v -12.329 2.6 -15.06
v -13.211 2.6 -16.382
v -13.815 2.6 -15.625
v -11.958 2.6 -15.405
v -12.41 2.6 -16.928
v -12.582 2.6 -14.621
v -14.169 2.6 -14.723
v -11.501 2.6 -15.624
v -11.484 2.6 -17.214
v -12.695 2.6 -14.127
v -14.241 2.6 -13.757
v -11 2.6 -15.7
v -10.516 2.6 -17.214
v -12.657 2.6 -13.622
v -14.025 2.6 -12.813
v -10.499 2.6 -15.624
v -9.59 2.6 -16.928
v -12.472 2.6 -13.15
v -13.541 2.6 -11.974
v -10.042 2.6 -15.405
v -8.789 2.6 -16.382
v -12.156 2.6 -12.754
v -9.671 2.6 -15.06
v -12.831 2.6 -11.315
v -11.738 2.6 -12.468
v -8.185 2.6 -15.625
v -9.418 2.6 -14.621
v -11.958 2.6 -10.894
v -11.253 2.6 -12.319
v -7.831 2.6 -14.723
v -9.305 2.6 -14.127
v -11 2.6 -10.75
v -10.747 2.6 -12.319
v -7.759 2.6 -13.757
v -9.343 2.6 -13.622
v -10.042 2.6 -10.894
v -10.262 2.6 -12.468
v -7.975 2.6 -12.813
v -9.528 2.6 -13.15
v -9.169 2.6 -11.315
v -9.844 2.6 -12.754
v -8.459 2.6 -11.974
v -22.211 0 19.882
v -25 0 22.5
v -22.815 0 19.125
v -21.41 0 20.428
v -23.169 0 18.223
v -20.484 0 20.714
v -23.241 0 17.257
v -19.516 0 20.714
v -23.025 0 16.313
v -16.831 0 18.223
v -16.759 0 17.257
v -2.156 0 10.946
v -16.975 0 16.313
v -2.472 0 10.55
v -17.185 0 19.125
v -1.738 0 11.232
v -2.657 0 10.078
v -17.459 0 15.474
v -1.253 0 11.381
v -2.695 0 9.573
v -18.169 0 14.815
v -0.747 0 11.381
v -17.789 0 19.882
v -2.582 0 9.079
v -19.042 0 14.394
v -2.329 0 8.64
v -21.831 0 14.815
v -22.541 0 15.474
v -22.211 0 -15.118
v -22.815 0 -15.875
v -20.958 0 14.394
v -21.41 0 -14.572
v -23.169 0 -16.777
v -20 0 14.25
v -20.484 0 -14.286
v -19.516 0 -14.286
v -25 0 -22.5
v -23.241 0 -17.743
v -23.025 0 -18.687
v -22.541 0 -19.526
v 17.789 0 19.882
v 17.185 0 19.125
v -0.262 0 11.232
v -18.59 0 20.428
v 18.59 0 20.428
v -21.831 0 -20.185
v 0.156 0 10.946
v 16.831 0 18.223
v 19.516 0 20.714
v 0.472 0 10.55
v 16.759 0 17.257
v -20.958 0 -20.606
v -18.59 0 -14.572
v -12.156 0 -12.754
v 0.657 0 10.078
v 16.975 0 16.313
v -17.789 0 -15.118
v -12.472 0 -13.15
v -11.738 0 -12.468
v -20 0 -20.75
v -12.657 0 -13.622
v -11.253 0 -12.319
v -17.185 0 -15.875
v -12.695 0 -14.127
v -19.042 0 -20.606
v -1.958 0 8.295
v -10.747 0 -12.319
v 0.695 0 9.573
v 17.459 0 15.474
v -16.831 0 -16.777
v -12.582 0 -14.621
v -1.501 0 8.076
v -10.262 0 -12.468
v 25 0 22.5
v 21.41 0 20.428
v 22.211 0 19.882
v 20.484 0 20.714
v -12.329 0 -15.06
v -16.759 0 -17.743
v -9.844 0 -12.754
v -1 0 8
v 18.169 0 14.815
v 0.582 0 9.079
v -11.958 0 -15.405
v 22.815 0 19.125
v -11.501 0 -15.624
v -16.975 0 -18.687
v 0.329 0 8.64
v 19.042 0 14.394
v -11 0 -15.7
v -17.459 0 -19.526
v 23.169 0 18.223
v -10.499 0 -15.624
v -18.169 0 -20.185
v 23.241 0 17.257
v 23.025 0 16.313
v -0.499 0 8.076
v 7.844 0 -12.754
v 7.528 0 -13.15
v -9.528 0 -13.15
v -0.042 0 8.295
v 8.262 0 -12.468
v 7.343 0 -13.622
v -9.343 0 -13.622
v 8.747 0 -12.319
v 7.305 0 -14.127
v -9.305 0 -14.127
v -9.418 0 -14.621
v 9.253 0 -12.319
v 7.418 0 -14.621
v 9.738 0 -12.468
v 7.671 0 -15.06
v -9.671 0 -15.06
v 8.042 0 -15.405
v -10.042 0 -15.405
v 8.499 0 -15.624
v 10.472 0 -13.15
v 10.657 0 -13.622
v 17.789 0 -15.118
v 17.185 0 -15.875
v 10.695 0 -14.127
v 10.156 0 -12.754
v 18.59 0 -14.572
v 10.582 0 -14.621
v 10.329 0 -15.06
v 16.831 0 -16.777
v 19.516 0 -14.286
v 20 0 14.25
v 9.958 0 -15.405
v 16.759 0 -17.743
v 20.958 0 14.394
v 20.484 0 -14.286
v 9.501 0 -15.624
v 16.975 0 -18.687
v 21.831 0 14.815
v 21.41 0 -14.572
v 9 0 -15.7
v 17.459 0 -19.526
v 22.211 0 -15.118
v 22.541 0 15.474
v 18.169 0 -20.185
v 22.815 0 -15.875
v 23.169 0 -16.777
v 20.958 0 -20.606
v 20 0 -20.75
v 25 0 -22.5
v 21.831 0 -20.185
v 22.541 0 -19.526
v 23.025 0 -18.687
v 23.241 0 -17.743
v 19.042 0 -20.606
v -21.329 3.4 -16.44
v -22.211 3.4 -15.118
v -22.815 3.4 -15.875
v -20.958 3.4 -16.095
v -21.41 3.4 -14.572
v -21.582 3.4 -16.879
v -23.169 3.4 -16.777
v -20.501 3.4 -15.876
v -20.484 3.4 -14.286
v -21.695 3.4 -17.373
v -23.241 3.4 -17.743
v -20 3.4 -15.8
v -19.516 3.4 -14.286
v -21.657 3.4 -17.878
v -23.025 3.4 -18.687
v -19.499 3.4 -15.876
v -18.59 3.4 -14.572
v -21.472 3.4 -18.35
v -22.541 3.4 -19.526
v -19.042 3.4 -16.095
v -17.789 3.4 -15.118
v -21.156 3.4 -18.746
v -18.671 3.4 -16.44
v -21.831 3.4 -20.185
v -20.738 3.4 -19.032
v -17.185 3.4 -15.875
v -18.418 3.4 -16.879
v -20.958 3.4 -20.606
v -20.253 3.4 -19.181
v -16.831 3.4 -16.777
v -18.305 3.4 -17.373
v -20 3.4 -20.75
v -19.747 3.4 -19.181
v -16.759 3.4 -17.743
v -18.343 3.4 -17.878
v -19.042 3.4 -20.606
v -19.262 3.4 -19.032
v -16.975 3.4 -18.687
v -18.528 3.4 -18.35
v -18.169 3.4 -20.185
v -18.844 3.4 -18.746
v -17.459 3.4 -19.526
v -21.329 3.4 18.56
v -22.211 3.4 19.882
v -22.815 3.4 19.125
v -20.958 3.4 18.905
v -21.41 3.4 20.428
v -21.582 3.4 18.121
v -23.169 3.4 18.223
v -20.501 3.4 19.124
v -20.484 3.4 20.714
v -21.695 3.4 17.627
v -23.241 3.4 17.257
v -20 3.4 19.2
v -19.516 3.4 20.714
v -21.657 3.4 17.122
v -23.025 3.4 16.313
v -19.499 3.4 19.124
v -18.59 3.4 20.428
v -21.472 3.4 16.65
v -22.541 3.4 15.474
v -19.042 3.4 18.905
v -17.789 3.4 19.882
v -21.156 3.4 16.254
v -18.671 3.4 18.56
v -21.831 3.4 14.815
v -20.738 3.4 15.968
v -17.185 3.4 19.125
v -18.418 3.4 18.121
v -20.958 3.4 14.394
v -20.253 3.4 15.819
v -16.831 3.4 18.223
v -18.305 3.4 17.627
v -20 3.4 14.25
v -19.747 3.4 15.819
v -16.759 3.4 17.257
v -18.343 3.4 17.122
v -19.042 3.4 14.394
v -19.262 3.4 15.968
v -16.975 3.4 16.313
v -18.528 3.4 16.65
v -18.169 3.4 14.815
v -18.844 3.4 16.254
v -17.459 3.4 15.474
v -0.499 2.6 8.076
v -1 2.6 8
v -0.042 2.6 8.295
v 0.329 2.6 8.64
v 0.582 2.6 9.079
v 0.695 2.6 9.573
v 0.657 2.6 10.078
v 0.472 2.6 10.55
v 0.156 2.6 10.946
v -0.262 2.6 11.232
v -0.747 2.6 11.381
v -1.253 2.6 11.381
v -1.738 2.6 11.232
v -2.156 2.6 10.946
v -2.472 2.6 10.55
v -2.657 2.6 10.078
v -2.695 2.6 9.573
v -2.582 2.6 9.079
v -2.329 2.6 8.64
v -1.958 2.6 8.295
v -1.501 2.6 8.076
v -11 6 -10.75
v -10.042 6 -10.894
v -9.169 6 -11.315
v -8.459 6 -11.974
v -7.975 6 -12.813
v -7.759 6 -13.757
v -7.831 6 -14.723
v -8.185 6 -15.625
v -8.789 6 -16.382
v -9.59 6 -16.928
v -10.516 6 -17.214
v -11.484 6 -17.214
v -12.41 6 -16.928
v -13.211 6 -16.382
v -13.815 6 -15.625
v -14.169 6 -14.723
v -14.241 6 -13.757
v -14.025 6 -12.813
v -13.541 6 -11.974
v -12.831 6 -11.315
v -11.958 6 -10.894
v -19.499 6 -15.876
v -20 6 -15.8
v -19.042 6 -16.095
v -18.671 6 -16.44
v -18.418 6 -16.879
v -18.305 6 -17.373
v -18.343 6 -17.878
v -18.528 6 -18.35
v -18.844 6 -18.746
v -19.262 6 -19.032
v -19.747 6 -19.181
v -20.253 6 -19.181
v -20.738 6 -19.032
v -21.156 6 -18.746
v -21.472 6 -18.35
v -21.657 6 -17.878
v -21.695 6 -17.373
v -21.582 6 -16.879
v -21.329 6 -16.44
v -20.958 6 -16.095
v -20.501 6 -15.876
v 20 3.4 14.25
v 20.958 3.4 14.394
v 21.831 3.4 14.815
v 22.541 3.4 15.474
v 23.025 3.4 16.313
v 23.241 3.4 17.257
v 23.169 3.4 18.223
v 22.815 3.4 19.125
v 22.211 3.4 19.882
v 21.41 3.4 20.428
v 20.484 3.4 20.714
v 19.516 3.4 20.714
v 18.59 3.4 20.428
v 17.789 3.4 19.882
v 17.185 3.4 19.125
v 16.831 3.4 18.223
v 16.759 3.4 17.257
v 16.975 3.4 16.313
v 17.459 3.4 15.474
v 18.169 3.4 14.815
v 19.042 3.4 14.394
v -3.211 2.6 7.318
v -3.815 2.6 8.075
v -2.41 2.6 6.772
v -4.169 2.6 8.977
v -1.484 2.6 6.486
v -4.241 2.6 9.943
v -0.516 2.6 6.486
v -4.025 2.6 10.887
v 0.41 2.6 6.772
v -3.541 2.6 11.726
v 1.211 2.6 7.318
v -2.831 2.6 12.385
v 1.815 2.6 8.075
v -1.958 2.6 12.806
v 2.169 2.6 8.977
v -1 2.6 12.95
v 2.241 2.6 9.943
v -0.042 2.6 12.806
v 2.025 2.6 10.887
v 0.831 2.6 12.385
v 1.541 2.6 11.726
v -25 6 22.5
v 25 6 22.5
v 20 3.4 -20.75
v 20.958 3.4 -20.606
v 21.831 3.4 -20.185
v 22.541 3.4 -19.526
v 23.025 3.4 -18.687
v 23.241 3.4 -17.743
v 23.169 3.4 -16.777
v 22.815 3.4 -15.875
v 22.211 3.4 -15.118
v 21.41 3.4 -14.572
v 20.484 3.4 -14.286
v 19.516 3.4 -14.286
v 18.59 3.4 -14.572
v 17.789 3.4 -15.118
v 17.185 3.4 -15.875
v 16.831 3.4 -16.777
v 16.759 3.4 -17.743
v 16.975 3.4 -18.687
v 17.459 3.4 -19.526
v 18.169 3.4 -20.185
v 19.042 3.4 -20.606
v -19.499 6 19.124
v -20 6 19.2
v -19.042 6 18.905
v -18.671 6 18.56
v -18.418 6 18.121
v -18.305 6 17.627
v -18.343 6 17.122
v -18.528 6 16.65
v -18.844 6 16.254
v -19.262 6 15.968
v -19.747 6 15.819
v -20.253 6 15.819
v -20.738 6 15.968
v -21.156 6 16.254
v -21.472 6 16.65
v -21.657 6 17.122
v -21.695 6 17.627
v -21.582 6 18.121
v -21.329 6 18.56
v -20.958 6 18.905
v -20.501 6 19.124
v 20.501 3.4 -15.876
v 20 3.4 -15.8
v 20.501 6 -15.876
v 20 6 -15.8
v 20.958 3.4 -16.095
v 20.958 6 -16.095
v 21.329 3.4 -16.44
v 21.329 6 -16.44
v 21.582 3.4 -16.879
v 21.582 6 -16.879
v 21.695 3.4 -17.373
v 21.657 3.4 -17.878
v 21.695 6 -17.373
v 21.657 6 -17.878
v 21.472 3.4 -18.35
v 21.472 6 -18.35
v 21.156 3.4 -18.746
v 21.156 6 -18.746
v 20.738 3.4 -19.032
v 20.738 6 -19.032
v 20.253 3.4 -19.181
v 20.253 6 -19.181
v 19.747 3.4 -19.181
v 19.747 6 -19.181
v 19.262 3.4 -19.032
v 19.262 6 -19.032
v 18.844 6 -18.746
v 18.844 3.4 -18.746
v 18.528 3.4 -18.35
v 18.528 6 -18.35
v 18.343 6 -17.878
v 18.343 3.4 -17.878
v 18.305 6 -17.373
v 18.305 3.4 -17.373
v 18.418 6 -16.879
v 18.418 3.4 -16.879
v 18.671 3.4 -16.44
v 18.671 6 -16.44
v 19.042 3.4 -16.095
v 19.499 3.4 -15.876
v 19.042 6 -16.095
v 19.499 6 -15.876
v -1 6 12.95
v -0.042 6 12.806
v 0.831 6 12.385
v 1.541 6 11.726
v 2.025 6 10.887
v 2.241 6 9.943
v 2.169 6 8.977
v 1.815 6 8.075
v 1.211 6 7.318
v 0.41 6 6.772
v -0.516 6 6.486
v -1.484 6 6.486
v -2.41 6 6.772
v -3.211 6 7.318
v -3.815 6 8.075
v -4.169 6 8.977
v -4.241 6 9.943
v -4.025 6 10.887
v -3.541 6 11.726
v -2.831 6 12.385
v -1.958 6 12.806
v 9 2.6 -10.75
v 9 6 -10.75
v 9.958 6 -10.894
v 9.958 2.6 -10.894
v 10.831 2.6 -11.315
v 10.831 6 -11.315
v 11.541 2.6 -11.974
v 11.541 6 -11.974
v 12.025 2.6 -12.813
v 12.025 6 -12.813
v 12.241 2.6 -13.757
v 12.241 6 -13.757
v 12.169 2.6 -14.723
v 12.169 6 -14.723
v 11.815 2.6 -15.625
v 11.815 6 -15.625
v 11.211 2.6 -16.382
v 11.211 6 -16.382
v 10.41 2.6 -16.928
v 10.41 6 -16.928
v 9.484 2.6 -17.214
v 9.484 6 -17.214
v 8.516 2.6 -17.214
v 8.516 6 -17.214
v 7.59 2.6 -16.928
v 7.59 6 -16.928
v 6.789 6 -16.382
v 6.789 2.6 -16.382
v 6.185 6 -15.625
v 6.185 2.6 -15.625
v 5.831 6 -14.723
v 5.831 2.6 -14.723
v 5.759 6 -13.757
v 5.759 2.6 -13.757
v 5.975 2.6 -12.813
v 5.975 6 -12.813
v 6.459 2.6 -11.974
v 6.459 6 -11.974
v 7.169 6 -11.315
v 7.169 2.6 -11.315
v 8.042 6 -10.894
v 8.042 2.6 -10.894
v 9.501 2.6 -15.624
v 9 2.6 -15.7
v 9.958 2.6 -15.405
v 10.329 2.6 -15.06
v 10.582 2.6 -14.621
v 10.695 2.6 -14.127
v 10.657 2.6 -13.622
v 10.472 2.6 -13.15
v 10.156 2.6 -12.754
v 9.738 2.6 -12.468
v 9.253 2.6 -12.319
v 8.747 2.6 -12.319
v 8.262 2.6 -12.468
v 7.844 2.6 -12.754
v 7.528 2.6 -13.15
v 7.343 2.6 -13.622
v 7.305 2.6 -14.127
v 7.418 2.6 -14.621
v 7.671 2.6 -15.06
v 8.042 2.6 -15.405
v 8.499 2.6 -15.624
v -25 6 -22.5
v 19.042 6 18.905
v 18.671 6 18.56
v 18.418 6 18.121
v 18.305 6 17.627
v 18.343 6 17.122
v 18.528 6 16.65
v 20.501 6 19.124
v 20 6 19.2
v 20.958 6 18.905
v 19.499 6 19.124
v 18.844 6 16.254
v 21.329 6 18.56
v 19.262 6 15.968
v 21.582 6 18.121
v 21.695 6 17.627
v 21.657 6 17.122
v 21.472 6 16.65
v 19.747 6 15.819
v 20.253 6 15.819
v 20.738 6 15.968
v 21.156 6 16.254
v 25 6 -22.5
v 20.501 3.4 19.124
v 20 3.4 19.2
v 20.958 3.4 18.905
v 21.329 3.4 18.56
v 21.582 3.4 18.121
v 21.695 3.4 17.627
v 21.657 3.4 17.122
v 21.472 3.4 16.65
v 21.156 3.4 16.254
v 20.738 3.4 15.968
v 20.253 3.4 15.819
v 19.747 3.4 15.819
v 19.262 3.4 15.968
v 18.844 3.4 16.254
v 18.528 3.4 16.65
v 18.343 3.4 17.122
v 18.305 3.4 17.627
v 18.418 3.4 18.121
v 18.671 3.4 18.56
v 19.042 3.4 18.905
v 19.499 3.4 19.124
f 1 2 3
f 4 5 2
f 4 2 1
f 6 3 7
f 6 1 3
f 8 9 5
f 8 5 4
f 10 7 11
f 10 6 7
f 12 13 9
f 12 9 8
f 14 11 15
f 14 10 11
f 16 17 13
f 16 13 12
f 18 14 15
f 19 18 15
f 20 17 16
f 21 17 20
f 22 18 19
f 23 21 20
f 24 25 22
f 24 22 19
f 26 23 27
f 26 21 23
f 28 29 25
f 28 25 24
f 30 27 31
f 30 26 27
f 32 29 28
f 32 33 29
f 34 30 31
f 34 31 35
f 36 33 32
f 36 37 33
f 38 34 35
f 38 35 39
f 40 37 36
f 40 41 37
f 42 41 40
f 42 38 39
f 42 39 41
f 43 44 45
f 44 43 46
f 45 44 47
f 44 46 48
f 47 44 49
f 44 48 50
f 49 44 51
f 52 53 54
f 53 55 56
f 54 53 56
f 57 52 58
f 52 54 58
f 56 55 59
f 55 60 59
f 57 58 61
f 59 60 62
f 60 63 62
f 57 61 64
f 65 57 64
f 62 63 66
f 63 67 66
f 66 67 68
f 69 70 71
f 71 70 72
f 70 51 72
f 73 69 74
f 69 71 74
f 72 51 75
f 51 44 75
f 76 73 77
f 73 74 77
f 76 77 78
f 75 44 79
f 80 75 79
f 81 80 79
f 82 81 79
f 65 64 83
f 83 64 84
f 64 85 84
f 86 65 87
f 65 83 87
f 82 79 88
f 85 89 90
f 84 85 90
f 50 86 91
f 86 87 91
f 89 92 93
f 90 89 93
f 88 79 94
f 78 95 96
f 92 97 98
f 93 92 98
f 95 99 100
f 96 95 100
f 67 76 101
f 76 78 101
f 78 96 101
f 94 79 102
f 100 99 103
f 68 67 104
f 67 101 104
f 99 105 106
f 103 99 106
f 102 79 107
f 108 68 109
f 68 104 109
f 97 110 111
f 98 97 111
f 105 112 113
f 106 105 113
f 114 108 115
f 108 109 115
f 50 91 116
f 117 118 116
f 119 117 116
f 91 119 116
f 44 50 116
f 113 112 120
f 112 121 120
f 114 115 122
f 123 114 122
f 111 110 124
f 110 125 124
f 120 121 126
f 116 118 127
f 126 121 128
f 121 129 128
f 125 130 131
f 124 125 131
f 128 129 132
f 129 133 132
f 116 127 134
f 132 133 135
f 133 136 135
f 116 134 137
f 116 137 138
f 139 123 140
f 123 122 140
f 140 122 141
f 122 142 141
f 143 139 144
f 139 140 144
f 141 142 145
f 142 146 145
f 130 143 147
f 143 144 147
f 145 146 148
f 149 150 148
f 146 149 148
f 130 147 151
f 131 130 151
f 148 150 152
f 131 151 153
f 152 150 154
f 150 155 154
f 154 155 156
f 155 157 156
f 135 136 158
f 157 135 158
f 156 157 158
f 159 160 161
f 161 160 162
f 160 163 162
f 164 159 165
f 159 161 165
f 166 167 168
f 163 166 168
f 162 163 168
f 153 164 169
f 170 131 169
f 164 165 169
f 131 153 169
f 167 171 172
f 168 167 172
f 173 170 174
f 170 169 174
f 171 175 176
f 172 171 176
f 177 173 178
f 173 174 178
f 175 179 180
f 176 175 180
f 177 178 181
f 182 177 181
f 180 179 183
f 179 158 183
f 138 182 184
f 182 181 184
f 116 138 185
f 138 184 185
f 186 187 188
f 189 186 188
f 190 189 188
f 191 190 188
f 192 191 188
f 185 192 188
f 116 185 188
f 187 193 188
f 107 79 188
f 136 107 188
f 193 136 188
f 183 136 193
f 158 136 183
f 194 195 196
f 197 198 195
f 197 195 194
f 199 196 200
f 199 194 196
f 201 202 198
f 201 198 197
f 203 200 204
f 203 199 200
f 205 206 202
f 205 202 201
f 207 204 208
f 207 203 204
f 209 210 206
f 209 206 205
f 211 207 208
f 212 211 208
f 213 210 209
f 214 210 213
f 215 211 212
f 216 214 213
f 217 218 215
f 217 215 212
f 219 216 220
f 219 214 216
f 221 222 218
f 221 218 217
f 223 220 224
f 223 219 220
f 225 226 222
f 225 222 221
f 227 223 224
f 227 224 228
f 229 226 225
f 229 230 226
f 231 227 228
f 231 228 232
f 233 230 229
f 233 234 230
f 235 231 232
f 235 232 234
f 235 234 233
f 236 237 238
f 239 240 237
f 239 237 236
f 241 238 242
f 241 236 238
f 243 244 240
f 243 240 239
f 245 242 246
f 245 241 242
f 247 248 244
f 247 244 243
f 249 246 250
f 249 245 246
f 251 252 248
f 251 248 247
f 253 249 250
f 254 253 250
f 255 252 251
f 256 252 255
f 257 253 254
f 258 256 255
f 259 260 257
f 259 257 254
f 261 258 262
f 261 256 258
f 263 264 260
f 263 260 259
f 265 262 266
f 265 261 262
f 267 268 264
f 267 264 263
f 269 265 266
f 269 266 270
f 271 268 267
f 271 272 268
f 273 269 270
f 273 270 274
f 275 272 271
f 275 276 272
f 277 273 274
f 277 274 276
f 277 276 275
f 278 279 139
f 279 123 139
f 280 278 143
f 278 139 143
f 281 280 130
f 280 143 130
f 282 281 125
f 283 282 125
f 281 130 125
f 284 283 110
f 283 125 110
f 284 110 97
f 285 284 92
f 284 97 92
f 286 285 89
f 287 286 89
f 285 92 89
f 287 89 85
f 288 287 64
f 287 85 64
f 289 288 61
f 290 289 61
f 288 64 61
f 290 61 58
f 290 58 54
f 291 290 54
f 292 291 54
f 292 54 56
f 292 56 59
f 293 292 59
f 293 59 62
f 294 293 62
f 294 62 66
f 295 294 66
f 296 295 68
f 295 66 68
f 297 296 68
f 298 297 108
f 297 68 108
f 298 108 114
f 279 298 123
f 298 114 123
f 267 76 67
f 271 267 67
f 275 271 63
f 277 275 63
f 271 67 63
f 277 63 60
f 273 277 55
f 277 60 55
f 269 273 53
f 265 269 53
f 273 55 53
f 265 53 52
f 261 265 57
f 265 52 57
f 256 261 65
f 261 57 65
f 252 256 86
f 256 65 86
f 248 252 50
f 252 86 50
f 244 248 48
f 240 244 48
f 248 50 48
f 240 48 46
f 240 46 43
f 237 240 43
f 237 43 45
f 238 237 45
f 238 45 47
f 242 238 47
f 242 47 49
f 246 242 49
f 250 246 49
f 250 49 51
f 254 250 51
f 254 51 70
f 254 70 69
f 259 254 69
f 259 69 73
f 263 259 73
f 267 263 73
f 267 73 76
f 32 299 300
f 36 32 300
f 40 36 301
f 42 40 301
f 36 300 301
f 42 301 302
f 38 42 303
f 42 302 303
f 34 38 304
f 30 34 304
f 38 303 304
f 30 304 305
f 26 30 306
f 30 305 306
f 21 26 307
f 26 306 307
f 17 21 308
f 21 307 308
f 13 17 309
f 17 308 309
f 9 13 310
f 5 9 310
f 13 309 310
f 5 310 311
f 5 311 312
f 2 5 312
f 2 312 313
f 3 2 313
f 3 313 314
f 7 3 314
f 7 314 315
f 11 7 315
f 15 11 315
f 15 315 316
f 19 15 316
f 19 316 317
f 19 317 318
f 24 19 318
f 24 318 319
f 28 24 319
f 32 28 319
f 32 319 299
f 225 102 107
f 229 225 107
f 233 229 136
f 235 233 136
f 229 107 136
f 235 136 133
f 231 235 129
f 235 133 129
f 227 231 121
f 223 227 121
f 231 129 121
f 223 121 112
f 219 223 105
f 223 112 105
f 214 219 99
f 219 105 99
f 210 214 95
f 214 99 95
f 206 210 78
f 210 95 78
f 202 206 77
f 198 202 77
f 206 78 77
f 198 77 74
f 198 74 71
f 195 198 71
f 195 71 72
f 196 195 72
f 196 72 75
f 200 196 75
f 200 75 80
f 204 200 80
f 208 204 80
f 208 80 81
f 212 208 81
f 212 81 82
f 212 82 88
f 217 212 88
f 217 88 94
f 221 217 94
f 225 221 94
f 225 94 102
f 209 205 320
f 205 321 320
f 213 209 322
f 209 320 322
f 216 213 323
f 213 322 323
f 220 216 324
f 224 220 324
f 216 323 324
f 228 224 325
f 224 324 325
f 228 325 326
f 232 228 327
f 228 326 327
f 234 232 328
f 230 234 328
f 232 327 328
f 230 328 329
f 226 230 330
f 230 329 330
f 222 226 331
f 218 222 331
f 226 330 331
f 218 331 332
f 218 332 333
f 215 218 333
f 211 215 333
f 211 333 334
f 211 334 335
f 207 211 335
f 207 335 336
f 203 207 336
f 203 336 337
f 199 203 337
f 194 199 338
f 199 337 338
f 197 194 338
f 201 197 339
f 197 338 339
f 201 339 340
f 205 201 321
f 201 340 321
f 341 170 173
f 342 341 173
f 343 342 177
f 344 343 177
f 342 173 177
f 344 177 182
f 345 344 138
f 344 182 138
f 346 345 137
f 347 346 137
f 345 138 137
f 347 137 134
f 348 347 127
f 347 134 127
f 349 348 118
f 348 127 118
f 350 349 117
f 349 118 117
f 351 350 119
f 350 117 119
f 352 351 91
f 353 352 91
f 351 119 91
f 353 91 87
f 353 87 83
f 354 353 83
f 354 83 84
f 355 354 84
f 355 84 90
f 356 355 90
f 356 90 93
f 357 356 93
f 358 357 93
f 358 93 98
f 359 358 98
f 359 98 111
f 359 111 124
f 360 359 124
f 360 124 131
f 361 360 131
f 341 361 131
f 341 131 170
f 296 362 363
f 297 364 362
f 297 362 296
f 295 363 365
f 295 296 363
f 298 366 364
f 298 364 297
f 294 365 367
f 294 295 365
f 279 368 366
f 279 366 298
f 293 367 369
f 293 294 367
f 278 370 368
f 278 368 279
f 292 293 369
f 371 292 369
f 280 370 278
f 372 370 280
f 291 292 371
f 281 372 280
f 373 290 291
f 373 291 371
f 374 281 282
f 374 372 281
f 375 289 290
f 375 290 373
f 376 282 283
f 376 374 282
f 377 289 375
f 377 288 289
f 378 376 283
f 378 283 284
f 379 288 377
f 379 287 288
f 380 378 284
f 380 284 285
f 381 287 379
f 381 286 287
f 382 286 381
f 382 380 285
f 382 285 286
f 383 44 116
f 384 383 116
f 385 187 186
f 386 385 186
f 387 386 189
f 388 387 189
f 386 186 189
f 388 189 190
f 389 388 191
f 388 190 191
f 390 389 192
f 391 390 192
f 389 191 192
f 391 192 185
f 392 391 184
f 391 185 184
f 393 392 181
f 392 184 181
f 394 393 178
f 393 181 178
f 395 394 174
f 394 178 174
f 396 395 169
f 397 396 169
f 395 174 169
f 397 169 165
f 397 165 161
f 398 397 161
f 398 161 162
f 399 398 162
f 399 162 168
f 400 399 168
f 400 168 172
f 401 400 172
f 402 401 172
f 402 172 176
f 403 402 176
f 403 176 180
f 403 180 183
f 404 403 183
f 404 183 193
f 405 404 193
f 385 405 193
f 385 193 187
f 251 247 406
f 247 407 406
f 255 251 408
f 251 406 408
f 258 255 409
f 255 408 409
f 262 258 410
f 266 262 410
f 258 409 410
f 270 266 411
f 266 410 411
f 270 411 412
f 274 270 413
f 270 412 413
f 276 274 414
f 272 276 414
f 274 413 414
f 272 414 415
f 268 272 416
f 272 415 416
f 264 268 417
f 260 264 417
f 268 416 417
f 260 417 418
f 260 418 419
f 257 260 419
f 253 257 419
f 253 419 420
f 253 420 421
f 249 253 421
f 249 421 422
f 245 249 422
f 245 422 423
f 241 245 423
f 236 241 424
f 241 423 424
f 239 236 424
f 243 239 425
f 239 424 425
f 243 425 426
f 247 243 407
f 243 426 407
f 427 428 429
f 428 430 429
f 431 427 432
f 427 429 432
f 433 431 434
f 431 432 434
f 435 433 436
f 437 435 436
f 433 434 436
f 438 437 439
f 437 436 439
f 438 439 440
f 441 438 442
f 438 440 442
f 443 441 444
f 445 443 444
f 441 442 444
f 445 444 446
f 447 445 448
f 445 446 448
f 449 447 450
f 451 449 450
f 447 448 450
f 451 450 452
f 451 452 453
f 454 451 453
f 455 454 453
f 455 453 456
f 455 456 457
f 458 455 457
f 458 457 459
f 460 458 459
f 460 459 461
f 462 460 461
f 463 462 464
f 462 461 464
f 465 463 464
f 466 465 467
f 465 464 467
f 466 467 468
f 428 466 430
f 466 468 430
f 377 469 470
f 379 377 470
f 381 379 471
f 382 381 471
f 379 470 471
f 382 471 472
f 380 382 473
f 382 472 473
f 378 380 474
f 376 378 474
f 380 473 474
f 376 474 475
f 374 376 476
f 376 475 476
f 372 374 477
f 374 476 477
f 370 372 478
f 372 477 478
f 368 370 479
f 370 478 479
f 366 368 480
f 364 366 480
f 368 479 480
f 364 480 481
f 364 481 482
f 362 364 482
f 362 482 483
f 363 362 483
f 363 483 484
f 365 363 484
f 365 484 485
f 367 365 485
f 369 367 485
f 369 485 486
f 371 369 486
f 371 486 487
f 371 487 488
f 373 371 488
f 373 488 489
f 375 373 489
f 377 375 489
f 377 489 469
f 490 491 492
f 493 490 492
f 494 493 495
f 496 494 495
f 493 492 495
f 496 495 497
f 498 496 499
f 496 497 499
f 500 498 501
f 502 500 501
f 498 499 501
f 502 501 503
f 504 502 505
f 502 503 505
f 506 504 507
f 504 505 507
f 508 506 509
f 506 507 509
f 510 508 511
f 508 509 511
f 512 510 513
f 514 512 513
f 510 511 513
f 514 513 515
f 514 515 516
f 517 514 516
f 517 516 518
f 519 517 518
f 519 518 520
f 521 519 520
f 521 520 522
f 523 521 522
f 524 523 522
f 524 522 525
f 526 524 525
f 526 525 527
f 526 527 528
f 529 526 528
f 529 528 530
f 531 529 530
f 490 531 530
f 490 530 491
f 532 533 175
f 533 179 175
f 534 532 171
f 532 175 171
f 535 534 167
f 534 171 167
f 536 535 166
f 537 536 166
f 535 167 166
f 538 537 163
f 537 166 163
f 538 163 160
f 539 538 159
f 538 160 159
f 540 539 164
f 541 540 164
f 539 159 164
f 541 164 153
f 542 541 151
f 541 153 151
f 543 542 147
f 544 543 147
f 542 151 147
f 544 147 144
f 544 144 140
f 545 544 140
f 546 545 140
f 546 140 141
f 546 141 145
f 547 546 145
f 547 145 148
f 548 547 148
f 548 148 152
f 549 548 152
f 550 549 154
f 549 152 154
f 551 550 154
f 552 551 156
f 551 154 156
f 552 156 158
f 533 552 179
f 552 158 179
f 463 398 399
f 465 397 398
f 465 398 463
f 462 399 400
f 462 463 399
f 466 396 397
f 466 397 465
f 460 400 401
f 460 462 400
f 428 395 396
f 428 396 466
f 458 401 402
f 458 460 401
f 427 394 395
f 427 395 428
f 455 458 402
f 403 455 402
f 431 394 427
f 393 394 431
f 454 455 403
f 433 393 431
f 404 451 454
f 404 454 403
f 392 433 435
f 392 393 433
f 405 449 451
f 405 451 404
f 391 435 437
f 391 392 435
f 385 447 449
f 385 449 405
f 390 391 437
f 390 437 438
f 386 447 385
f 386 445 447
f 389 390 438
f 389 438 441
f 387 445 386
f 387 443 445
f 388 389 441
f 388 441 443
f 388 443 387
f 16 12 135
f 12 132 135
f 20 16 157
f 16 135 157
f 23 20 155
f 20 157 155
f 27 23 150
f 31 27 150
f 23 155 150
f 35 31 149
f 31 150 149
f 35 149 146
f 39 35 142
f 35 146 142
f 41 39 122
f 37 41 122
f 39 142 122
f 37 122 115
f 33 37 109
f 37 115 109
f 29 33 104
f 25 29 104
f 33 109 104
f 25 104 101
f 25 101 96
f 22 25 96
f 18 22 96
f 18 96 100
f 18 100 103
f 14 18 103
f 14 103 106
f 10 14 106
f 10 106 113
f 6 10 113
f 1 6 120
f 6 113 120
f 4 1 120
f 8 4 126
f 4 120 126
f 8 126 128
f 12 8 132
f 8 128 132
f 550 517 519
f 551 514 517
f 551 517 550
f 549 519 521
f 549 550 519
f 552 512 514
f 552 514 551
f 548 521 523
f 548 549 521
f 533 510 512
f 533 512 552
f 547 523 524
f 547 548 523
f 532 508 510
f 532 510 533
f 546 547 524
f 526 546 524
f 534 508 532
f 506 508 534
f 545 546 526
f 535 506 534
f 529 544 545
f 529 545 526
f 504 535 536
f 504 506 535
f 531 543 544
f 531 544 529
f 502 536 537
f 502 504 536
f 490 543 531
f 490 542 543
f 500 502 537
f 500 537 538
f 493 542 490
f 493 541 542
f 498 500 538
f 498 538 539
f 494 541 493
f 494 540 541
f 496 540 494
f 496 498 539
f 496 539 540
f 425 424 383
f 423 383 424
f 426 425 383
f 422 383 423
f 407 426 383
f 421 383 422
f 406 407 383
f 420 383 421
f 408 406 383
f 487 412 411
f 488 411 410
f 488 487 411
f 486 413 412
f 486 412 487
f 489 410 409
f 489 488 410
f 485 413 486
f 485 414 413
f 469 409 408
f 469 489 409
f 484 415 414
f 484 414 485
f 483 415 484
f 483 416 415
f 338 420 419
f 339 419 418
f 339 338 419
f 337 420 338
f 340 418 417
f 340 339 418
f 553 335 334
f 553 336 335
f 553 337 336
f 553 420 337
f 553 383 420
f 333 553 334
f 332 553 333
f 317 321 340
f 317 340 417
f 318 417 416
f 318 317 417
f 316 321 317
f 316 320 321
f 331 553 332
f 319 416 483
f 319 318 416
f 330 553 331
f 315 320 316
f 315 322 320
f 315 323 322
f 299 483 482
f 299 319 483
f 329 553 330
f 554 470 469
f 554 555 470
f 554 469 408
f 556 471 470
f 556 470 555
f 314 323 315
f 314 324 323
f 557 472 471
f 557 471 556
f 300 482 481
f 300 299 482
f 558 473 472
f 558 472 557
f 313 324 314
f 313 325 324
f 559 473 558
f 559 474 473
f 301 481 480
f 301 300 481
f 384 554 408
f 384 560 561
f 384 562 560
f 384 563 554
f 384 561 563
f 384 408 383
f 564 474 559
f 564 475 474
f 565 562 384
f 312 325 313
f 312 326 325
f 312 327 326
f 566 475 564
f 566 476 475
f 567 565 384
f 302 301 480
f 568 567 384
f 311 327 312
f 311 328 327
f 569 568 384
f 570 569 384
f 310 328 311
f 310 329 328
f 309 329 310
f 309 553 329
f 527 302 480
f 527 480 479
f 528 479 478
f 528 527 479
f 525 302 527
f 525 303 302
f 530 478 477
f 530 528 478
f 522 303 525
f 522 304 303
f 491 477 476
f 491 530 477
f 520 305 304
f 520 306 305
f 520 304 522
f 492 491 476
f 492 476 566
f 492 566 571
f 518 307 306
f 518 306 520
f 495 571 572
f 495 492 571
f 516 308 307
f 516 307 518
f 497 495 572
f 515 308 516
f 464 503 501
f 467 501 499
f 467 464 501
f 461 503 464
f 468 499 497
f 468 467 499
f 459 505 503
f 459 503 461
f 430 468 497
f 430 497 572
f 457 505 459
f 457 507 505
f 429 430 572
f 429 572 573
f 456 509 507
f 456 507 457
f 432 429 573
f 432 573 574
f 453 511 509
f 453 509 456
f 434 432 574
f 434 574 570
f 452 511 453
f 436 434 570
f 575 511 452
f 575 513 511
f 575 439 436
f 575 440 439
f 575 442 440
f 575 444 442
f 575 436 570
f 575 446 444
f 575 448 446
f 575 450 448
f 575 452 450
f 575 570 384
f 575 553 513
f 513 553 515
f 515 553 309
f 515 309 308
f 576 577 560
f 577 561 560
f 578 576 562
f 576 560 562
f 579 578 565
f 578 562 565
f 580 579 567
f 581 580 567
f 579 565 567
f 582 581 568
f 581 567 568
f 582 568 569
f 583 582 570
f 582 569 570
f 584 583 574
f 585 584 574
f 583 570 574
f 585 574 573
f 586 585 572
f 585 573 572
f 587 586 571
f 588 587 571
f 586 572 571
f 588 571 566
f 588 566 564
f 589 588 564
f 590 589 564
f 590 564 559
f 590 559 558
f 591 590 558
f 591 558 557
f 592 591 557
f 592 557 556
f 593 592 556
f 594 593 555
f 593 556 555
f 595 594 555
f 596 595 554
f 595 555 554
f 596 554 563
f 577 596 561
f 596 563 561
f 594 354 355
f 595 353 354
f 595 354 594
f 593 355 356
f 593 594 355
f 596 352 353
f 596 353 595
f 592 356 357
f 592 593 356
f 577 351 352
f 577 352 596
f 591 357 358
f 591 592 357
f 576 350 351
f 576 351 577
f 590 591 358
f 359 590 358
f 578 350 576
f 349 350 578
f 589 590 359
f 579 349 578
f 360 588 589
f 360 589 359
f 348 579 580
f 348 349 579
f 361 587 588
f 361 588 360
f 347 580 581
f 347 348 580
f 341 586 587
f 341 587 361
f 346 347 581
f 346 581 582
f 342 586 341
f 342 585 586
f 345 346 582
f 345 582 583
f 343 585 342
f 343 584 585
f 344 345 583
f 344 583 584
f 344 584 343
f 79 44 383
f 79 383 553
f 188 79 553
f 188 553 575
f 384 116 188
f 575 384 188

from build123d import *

# Parameters (mm, degrees)
SKETCH_1_W                   = 50
SKETCH_1_H                   = 45
EXTRUDE_1_DEPTH              = 6
HOLE_WIZARD_M3_1_D           = 3.4
HOLE_WIZARD_M3_1_CBORE_D     = 6.5
HOLE_WIZARD_M3_1_CBORE_DEPTH = 3.4
HOLE_WIZARD_M3_2_D           = 3.4
HOLE_WIZARD_M3_2_CBORE_D     = 6.5
HOLE_WIZARD_M3_2_CBORE_DEPTH = 3.4


with BuildPart() as part:
    # 草图1 → 凸台-拉伸1 (new body)
    with BuildSketch(Plane(origin=(0, 0, 0), x_dir=(1, 0, 0), z_dir=(0, 1, 0))):
        Rectangle(SKETCH_1_W, SKETCH_1_H)
    extrude(amount=EXTRUDE_1_DEPTH)

    # M3 六角凹头螺钉的柱形沉头孔1 (through all)
    with Locations(Plane(origin=(-20, 0, 17.5), x_dir=(0, 0, -1), z_dir=(0, -1, 0))):
        with Locations((0, 0), (0, 40), (35, 40), (35, 0)):
            CounterBoreHole(HOLE_WIZARD_M3_1_D / 2, HOLE_WIZARD_M3_1_CBORE_D / 2, HOLE_WIZARD_M3_1_CBORE_DEPTH)

    # M3 六角凹头螺钉的柱形沉头孔2 (through all)
    with Locations(Plane(origin=(-11, 6, -14), x_dir=(0, 0, 1), z_dir=(0, 1, 0))):
        with Locations((0, 0), (0, 20), (23.7, 10)):
            CounterBoreHole(HOLE_WIZARD_M3_2_D / 2, HOLE_WIZARD_M3_2_CBORE_D / 2, HOLE_WIZARD_M3_2_CBORE_DEPTH)


solid = part.part
